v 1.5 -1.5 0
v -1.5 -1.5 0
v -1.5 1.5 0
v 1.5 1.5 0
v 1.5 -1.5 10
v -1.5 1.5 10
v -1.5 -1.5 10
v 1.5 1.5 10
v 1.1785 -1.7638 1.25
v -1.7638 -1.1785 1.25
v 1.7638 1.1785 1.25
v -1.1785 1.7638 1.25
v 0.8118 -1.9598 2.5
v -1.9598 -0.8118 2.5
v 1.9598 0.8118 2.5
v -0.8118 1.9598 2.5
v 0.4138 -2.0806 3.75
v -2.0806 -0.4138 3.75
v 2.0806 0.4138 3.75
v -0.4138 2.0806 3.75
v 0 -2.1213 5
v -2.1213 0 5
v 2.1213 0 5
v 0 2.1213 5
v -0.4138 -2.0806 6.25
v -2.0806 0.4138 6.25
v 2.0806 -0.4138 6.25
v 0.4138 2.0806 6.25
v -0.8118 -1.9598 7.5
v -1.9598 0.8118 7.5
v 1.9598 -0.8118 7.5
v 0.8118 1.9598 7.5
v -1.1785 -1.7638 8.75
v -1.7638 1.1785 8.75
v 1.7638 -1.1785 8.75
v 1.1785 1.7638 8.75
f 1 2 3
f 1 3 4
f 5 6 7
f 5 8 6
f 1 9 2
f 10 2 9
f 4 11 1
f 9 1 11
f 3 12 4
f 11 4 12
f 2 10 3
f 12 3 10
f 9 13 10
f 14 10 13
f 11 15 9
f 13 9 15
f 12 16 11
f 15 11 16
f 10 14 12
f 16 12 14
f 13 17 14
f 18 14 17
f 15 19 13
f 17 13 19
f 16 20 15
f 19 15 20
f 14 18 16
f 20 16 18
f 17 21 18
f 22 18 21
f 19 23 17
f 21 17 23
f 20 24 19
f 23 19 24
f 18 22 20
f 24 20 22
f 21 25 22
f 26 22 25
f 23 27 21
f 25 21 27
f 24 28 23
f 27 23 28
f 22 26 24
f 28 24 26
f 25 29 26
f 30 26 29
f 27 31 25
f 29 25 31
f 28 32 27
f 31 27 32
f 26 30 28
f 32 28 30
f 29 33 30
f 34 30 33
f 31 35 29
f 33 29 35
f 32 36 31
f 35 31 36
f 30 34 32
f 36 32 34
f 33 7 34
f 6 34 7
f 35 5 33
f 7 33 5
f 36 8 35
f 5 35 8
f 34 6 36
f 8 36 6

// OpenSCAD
// twist with explicit slices
linear_extrude(height = 10, twist = 90, slices = 8) square(3, center = true);
